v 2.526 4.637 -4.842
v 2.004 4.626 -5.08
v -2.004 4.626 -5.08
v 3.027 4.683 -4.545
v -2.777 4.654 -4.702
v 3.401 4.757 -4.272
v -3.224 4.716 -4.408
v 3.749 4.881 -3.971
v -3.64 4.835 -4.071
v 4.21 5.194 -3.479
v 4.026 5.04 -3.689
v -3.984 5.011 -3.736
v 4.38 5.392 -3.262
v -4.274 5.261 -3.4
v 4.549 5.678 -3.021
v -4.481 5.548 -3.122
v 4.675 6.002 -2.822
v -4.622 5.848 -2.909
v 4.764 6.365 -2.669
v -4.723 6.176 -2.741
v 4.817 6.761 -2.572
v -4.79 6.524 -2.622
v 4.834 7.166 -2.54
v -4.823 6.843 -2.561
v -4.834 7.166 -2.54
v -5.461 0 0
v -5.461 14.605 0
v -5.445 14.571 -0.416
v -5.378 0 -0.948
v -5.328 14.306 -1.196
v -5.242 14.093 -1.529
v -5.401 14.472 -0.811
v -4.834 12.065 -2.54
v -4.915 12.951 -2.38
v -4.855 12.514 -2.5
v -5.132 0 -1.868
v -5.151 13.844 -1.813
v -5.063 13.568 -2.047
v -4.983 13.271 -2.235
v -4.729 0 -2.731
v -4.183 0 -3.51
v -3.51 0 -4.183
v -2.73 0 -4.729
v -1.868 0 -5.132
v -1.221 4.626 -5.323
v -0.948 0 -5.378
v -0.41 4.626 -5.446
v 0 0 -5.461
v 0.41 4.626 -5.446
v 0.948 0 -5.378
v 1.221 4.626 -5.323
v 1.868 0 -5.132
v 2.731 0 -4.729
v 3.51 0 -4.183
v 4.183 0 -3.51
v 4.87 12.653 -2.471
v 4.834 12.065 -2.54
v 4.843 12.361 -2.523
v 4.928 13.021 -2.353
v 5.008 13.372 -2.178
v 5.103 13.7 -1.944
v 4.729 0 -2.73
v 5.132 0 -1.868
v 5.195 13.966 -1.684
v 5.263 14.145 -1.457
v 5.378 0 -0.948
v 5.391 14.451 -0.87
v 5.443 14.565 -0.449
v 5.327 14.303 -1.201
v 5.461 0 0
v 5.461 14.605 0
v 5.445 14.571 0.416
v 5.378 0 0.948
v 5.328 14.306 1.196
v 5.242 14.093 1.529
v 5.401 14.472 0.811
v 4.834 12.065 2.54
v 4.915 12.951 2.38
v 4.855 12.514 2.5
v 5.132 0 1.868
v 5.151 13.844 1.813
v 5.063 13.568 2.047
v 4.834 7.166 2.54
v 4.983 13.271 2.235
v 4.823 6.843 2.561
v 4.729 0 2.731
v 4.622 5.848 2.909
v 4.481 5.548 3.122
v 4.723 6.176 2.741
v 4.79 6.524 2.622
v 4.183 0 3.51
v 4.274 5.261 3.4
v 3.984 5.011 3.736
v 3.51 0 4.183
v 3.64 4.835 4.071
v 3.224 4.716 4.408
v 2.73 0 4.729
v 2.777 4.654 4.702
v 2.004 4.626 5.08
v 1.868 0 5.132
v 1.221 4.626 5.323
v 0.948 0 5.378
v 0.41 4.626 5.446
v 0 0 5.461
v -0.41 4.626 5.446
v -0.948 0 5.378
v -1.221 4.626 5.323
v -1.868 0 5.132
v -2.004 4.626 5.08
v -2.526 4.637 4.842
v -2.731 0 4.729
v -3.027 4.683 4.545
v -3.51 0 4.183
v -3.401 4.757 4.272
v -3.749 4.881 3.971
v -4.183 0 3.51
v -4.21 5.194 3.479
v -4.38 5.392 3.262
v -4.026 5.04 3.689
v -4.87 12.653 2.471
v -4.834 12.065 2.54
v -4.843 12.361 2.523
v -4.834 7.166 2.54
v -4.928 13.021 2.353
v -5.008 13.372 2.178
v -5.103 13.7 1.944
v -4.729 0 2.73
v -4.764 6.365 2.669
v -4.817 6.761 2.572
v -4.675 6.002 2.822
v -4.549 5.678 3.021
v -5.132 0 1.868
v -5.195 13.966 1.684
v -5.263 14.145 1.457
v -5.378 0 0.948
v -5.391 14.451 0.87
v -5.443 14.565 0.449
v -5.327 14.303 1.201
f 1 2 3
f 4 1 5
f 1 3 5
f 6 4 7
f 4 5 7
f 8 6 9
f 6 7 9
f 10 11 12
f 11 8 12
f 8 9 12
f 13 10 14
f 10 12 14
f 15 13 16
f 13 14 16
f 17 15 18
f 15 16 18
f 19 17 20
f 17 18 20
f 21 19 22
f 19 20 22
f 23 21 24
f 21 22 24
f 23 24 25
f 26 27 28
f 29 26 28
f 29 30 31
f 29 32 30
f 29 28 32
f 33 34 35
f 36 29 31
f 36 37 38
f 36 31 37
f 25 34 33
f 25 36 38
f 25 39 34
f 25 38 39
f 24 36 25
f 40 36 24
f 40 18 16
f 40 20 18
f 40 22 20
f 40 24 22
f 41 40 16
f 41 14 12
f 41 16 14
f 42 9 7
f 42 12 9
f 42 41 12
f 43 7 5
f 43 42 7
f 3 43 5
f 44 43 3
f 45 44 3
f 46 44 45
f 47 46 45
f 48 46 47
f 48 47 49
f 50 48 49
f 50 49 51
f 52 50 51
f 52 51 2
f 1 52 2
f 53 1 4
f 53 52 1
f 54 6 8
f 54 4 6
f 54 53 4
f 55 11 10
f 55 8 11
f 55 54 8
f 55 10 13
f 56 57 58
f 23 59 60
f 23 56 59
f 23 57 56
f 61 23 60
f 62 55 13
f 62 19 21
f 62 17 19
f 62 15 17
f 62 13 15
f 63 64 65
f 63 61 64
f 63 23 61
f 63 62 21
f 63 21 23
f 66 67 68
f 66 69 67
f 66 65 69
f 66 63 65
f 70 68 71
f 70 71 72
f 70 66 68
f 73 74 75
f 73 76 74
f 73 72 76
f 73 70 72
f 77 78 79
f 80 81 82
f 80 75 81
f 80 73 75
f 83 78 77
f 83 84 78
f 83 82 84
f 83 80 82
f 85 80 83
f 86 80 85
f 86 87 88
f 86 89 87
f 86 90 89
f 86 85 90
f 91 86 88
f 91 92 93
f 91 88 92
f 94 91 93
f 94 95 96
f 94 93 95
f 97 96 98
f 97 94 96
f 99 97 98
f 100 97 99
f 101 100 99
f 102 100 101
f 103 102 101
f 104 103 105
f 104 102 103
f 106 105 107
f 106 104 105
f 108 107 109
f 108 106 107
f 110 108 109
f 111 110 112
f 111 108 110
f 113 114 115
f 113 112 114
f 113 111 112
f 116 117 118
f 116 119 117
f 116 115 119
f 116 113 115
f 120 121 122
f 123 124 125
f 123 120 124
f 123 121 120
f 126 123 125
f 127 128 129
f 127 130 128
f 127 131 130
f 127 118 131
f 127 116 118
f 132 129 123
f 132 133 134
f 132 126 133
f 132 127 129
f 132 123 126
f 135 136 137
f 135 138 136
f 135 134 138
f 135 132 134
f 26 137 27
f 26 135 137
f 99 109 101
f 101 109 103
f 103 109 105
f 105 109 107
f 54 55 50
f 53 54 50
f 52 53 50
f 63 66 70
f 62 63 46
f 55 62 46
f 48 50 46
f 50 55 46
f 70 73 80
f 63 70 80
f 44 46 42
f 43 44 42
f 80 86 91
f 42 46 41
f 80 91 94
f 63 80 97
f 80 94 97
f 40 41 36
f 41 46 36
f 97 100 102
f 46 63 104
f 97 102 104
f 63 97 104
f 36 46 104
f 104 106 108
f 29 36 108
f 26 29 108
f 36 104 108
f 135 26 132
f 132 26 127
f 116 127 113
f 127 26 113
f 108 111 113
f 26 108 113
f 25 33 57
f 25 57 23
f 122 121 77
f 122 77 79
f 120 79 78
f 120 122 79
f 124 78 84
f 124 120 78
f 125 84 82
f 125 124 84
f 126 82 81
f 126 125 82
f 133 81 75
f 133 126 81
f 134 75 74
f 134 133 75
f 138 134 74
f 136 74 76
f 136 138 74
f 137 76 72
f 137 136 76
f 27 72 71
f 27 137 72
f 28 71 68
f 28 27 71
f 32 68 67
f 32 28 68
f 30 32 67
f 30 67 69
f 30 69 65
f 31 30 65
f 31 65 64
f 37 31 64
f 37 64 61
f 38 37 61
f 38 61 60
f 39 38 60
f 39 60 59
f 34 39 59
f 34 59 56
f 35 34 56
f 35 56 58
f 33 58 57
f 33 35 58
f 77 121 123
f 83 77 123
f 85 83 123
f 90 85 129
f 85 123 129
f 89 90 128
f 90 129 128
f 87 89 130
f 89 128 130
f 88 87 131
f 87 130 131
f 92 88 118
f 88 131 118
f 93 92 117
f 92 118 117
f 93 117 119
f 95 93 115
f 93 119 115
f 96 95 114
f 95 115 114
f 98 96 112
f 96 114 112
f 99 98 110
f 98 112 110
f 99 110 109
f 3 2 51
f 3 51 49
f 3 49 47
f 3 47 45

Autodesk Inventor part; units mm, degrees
ref_plane "YZ Plane" through (0, 0, 0) normal (1, 0, 0) x (0, 1, 0)
ref_plane "XZ Plane" through (0, 0, 0) normal (0, 1, 0) x (-1, 0, 0)
ref_plane "XY Plane" through (0, 0, 0) normal (0, 0, 1) x (1, 0, 0)
sketch "Sketch1" plane through (0, 0, 0) normal (0, 1, 0) x (-1, 0, 0)
  circle A0 centre (0, 0) radius 2.54
  circle A1 centre (0, 0) radius 5.461
  dimension "d0" = 5.08
  dimension "d1" = 10.922
extrude "Extrusion1" add sketch "Sketch1" along normal blind 14.605 contours A0 | A1
sketch "Sketch2" plane through (0, 0, 0) normal (1, 0, 0) x (0, 1, 0)
  arc A0 (12.065, -2.54) -> (12.065, 2.54) centre (12.065, 0) ccw
  line L0 (0, 5.461) -> (14.605, 5.461) projected
  line L1 (0, -5.461) -> (14.605, -5.461) projected
  line L2 (12.065, 2.54) -> (7.1656, 2.54)
  line L3 (12.065, -2.54) -> (7.1656, -2.54)
  line L4 (4.6256, 5.461) -> (4.6256, 5.08)
  line L5 (4.6256, -5.08) -> (4.6256, -5.461)
  arc A1 (4.6256, 5.08) -> (7.1656, 2.54) centre (7.1656, 5.08) ccw
  arc A2 (7.1656, -2.54) -> (4.6256, -5.08) centre (7.1656, -5.08) ccw
  line L6 (14.605, 2.54) -> (14.605, -2.54) projected
  line L7 (14.605, -5.461) -> (14.605, 5.461) projected
  point P0 (0, 0)
  point P1 (14.605, 0)
  dimension "d4" = 2.54
  dimension "d5" = 2.54
extrude "Extrusion2" cut sketch "Sketch2" along normal mid plane 14.605
properties part number "Half Universal"
